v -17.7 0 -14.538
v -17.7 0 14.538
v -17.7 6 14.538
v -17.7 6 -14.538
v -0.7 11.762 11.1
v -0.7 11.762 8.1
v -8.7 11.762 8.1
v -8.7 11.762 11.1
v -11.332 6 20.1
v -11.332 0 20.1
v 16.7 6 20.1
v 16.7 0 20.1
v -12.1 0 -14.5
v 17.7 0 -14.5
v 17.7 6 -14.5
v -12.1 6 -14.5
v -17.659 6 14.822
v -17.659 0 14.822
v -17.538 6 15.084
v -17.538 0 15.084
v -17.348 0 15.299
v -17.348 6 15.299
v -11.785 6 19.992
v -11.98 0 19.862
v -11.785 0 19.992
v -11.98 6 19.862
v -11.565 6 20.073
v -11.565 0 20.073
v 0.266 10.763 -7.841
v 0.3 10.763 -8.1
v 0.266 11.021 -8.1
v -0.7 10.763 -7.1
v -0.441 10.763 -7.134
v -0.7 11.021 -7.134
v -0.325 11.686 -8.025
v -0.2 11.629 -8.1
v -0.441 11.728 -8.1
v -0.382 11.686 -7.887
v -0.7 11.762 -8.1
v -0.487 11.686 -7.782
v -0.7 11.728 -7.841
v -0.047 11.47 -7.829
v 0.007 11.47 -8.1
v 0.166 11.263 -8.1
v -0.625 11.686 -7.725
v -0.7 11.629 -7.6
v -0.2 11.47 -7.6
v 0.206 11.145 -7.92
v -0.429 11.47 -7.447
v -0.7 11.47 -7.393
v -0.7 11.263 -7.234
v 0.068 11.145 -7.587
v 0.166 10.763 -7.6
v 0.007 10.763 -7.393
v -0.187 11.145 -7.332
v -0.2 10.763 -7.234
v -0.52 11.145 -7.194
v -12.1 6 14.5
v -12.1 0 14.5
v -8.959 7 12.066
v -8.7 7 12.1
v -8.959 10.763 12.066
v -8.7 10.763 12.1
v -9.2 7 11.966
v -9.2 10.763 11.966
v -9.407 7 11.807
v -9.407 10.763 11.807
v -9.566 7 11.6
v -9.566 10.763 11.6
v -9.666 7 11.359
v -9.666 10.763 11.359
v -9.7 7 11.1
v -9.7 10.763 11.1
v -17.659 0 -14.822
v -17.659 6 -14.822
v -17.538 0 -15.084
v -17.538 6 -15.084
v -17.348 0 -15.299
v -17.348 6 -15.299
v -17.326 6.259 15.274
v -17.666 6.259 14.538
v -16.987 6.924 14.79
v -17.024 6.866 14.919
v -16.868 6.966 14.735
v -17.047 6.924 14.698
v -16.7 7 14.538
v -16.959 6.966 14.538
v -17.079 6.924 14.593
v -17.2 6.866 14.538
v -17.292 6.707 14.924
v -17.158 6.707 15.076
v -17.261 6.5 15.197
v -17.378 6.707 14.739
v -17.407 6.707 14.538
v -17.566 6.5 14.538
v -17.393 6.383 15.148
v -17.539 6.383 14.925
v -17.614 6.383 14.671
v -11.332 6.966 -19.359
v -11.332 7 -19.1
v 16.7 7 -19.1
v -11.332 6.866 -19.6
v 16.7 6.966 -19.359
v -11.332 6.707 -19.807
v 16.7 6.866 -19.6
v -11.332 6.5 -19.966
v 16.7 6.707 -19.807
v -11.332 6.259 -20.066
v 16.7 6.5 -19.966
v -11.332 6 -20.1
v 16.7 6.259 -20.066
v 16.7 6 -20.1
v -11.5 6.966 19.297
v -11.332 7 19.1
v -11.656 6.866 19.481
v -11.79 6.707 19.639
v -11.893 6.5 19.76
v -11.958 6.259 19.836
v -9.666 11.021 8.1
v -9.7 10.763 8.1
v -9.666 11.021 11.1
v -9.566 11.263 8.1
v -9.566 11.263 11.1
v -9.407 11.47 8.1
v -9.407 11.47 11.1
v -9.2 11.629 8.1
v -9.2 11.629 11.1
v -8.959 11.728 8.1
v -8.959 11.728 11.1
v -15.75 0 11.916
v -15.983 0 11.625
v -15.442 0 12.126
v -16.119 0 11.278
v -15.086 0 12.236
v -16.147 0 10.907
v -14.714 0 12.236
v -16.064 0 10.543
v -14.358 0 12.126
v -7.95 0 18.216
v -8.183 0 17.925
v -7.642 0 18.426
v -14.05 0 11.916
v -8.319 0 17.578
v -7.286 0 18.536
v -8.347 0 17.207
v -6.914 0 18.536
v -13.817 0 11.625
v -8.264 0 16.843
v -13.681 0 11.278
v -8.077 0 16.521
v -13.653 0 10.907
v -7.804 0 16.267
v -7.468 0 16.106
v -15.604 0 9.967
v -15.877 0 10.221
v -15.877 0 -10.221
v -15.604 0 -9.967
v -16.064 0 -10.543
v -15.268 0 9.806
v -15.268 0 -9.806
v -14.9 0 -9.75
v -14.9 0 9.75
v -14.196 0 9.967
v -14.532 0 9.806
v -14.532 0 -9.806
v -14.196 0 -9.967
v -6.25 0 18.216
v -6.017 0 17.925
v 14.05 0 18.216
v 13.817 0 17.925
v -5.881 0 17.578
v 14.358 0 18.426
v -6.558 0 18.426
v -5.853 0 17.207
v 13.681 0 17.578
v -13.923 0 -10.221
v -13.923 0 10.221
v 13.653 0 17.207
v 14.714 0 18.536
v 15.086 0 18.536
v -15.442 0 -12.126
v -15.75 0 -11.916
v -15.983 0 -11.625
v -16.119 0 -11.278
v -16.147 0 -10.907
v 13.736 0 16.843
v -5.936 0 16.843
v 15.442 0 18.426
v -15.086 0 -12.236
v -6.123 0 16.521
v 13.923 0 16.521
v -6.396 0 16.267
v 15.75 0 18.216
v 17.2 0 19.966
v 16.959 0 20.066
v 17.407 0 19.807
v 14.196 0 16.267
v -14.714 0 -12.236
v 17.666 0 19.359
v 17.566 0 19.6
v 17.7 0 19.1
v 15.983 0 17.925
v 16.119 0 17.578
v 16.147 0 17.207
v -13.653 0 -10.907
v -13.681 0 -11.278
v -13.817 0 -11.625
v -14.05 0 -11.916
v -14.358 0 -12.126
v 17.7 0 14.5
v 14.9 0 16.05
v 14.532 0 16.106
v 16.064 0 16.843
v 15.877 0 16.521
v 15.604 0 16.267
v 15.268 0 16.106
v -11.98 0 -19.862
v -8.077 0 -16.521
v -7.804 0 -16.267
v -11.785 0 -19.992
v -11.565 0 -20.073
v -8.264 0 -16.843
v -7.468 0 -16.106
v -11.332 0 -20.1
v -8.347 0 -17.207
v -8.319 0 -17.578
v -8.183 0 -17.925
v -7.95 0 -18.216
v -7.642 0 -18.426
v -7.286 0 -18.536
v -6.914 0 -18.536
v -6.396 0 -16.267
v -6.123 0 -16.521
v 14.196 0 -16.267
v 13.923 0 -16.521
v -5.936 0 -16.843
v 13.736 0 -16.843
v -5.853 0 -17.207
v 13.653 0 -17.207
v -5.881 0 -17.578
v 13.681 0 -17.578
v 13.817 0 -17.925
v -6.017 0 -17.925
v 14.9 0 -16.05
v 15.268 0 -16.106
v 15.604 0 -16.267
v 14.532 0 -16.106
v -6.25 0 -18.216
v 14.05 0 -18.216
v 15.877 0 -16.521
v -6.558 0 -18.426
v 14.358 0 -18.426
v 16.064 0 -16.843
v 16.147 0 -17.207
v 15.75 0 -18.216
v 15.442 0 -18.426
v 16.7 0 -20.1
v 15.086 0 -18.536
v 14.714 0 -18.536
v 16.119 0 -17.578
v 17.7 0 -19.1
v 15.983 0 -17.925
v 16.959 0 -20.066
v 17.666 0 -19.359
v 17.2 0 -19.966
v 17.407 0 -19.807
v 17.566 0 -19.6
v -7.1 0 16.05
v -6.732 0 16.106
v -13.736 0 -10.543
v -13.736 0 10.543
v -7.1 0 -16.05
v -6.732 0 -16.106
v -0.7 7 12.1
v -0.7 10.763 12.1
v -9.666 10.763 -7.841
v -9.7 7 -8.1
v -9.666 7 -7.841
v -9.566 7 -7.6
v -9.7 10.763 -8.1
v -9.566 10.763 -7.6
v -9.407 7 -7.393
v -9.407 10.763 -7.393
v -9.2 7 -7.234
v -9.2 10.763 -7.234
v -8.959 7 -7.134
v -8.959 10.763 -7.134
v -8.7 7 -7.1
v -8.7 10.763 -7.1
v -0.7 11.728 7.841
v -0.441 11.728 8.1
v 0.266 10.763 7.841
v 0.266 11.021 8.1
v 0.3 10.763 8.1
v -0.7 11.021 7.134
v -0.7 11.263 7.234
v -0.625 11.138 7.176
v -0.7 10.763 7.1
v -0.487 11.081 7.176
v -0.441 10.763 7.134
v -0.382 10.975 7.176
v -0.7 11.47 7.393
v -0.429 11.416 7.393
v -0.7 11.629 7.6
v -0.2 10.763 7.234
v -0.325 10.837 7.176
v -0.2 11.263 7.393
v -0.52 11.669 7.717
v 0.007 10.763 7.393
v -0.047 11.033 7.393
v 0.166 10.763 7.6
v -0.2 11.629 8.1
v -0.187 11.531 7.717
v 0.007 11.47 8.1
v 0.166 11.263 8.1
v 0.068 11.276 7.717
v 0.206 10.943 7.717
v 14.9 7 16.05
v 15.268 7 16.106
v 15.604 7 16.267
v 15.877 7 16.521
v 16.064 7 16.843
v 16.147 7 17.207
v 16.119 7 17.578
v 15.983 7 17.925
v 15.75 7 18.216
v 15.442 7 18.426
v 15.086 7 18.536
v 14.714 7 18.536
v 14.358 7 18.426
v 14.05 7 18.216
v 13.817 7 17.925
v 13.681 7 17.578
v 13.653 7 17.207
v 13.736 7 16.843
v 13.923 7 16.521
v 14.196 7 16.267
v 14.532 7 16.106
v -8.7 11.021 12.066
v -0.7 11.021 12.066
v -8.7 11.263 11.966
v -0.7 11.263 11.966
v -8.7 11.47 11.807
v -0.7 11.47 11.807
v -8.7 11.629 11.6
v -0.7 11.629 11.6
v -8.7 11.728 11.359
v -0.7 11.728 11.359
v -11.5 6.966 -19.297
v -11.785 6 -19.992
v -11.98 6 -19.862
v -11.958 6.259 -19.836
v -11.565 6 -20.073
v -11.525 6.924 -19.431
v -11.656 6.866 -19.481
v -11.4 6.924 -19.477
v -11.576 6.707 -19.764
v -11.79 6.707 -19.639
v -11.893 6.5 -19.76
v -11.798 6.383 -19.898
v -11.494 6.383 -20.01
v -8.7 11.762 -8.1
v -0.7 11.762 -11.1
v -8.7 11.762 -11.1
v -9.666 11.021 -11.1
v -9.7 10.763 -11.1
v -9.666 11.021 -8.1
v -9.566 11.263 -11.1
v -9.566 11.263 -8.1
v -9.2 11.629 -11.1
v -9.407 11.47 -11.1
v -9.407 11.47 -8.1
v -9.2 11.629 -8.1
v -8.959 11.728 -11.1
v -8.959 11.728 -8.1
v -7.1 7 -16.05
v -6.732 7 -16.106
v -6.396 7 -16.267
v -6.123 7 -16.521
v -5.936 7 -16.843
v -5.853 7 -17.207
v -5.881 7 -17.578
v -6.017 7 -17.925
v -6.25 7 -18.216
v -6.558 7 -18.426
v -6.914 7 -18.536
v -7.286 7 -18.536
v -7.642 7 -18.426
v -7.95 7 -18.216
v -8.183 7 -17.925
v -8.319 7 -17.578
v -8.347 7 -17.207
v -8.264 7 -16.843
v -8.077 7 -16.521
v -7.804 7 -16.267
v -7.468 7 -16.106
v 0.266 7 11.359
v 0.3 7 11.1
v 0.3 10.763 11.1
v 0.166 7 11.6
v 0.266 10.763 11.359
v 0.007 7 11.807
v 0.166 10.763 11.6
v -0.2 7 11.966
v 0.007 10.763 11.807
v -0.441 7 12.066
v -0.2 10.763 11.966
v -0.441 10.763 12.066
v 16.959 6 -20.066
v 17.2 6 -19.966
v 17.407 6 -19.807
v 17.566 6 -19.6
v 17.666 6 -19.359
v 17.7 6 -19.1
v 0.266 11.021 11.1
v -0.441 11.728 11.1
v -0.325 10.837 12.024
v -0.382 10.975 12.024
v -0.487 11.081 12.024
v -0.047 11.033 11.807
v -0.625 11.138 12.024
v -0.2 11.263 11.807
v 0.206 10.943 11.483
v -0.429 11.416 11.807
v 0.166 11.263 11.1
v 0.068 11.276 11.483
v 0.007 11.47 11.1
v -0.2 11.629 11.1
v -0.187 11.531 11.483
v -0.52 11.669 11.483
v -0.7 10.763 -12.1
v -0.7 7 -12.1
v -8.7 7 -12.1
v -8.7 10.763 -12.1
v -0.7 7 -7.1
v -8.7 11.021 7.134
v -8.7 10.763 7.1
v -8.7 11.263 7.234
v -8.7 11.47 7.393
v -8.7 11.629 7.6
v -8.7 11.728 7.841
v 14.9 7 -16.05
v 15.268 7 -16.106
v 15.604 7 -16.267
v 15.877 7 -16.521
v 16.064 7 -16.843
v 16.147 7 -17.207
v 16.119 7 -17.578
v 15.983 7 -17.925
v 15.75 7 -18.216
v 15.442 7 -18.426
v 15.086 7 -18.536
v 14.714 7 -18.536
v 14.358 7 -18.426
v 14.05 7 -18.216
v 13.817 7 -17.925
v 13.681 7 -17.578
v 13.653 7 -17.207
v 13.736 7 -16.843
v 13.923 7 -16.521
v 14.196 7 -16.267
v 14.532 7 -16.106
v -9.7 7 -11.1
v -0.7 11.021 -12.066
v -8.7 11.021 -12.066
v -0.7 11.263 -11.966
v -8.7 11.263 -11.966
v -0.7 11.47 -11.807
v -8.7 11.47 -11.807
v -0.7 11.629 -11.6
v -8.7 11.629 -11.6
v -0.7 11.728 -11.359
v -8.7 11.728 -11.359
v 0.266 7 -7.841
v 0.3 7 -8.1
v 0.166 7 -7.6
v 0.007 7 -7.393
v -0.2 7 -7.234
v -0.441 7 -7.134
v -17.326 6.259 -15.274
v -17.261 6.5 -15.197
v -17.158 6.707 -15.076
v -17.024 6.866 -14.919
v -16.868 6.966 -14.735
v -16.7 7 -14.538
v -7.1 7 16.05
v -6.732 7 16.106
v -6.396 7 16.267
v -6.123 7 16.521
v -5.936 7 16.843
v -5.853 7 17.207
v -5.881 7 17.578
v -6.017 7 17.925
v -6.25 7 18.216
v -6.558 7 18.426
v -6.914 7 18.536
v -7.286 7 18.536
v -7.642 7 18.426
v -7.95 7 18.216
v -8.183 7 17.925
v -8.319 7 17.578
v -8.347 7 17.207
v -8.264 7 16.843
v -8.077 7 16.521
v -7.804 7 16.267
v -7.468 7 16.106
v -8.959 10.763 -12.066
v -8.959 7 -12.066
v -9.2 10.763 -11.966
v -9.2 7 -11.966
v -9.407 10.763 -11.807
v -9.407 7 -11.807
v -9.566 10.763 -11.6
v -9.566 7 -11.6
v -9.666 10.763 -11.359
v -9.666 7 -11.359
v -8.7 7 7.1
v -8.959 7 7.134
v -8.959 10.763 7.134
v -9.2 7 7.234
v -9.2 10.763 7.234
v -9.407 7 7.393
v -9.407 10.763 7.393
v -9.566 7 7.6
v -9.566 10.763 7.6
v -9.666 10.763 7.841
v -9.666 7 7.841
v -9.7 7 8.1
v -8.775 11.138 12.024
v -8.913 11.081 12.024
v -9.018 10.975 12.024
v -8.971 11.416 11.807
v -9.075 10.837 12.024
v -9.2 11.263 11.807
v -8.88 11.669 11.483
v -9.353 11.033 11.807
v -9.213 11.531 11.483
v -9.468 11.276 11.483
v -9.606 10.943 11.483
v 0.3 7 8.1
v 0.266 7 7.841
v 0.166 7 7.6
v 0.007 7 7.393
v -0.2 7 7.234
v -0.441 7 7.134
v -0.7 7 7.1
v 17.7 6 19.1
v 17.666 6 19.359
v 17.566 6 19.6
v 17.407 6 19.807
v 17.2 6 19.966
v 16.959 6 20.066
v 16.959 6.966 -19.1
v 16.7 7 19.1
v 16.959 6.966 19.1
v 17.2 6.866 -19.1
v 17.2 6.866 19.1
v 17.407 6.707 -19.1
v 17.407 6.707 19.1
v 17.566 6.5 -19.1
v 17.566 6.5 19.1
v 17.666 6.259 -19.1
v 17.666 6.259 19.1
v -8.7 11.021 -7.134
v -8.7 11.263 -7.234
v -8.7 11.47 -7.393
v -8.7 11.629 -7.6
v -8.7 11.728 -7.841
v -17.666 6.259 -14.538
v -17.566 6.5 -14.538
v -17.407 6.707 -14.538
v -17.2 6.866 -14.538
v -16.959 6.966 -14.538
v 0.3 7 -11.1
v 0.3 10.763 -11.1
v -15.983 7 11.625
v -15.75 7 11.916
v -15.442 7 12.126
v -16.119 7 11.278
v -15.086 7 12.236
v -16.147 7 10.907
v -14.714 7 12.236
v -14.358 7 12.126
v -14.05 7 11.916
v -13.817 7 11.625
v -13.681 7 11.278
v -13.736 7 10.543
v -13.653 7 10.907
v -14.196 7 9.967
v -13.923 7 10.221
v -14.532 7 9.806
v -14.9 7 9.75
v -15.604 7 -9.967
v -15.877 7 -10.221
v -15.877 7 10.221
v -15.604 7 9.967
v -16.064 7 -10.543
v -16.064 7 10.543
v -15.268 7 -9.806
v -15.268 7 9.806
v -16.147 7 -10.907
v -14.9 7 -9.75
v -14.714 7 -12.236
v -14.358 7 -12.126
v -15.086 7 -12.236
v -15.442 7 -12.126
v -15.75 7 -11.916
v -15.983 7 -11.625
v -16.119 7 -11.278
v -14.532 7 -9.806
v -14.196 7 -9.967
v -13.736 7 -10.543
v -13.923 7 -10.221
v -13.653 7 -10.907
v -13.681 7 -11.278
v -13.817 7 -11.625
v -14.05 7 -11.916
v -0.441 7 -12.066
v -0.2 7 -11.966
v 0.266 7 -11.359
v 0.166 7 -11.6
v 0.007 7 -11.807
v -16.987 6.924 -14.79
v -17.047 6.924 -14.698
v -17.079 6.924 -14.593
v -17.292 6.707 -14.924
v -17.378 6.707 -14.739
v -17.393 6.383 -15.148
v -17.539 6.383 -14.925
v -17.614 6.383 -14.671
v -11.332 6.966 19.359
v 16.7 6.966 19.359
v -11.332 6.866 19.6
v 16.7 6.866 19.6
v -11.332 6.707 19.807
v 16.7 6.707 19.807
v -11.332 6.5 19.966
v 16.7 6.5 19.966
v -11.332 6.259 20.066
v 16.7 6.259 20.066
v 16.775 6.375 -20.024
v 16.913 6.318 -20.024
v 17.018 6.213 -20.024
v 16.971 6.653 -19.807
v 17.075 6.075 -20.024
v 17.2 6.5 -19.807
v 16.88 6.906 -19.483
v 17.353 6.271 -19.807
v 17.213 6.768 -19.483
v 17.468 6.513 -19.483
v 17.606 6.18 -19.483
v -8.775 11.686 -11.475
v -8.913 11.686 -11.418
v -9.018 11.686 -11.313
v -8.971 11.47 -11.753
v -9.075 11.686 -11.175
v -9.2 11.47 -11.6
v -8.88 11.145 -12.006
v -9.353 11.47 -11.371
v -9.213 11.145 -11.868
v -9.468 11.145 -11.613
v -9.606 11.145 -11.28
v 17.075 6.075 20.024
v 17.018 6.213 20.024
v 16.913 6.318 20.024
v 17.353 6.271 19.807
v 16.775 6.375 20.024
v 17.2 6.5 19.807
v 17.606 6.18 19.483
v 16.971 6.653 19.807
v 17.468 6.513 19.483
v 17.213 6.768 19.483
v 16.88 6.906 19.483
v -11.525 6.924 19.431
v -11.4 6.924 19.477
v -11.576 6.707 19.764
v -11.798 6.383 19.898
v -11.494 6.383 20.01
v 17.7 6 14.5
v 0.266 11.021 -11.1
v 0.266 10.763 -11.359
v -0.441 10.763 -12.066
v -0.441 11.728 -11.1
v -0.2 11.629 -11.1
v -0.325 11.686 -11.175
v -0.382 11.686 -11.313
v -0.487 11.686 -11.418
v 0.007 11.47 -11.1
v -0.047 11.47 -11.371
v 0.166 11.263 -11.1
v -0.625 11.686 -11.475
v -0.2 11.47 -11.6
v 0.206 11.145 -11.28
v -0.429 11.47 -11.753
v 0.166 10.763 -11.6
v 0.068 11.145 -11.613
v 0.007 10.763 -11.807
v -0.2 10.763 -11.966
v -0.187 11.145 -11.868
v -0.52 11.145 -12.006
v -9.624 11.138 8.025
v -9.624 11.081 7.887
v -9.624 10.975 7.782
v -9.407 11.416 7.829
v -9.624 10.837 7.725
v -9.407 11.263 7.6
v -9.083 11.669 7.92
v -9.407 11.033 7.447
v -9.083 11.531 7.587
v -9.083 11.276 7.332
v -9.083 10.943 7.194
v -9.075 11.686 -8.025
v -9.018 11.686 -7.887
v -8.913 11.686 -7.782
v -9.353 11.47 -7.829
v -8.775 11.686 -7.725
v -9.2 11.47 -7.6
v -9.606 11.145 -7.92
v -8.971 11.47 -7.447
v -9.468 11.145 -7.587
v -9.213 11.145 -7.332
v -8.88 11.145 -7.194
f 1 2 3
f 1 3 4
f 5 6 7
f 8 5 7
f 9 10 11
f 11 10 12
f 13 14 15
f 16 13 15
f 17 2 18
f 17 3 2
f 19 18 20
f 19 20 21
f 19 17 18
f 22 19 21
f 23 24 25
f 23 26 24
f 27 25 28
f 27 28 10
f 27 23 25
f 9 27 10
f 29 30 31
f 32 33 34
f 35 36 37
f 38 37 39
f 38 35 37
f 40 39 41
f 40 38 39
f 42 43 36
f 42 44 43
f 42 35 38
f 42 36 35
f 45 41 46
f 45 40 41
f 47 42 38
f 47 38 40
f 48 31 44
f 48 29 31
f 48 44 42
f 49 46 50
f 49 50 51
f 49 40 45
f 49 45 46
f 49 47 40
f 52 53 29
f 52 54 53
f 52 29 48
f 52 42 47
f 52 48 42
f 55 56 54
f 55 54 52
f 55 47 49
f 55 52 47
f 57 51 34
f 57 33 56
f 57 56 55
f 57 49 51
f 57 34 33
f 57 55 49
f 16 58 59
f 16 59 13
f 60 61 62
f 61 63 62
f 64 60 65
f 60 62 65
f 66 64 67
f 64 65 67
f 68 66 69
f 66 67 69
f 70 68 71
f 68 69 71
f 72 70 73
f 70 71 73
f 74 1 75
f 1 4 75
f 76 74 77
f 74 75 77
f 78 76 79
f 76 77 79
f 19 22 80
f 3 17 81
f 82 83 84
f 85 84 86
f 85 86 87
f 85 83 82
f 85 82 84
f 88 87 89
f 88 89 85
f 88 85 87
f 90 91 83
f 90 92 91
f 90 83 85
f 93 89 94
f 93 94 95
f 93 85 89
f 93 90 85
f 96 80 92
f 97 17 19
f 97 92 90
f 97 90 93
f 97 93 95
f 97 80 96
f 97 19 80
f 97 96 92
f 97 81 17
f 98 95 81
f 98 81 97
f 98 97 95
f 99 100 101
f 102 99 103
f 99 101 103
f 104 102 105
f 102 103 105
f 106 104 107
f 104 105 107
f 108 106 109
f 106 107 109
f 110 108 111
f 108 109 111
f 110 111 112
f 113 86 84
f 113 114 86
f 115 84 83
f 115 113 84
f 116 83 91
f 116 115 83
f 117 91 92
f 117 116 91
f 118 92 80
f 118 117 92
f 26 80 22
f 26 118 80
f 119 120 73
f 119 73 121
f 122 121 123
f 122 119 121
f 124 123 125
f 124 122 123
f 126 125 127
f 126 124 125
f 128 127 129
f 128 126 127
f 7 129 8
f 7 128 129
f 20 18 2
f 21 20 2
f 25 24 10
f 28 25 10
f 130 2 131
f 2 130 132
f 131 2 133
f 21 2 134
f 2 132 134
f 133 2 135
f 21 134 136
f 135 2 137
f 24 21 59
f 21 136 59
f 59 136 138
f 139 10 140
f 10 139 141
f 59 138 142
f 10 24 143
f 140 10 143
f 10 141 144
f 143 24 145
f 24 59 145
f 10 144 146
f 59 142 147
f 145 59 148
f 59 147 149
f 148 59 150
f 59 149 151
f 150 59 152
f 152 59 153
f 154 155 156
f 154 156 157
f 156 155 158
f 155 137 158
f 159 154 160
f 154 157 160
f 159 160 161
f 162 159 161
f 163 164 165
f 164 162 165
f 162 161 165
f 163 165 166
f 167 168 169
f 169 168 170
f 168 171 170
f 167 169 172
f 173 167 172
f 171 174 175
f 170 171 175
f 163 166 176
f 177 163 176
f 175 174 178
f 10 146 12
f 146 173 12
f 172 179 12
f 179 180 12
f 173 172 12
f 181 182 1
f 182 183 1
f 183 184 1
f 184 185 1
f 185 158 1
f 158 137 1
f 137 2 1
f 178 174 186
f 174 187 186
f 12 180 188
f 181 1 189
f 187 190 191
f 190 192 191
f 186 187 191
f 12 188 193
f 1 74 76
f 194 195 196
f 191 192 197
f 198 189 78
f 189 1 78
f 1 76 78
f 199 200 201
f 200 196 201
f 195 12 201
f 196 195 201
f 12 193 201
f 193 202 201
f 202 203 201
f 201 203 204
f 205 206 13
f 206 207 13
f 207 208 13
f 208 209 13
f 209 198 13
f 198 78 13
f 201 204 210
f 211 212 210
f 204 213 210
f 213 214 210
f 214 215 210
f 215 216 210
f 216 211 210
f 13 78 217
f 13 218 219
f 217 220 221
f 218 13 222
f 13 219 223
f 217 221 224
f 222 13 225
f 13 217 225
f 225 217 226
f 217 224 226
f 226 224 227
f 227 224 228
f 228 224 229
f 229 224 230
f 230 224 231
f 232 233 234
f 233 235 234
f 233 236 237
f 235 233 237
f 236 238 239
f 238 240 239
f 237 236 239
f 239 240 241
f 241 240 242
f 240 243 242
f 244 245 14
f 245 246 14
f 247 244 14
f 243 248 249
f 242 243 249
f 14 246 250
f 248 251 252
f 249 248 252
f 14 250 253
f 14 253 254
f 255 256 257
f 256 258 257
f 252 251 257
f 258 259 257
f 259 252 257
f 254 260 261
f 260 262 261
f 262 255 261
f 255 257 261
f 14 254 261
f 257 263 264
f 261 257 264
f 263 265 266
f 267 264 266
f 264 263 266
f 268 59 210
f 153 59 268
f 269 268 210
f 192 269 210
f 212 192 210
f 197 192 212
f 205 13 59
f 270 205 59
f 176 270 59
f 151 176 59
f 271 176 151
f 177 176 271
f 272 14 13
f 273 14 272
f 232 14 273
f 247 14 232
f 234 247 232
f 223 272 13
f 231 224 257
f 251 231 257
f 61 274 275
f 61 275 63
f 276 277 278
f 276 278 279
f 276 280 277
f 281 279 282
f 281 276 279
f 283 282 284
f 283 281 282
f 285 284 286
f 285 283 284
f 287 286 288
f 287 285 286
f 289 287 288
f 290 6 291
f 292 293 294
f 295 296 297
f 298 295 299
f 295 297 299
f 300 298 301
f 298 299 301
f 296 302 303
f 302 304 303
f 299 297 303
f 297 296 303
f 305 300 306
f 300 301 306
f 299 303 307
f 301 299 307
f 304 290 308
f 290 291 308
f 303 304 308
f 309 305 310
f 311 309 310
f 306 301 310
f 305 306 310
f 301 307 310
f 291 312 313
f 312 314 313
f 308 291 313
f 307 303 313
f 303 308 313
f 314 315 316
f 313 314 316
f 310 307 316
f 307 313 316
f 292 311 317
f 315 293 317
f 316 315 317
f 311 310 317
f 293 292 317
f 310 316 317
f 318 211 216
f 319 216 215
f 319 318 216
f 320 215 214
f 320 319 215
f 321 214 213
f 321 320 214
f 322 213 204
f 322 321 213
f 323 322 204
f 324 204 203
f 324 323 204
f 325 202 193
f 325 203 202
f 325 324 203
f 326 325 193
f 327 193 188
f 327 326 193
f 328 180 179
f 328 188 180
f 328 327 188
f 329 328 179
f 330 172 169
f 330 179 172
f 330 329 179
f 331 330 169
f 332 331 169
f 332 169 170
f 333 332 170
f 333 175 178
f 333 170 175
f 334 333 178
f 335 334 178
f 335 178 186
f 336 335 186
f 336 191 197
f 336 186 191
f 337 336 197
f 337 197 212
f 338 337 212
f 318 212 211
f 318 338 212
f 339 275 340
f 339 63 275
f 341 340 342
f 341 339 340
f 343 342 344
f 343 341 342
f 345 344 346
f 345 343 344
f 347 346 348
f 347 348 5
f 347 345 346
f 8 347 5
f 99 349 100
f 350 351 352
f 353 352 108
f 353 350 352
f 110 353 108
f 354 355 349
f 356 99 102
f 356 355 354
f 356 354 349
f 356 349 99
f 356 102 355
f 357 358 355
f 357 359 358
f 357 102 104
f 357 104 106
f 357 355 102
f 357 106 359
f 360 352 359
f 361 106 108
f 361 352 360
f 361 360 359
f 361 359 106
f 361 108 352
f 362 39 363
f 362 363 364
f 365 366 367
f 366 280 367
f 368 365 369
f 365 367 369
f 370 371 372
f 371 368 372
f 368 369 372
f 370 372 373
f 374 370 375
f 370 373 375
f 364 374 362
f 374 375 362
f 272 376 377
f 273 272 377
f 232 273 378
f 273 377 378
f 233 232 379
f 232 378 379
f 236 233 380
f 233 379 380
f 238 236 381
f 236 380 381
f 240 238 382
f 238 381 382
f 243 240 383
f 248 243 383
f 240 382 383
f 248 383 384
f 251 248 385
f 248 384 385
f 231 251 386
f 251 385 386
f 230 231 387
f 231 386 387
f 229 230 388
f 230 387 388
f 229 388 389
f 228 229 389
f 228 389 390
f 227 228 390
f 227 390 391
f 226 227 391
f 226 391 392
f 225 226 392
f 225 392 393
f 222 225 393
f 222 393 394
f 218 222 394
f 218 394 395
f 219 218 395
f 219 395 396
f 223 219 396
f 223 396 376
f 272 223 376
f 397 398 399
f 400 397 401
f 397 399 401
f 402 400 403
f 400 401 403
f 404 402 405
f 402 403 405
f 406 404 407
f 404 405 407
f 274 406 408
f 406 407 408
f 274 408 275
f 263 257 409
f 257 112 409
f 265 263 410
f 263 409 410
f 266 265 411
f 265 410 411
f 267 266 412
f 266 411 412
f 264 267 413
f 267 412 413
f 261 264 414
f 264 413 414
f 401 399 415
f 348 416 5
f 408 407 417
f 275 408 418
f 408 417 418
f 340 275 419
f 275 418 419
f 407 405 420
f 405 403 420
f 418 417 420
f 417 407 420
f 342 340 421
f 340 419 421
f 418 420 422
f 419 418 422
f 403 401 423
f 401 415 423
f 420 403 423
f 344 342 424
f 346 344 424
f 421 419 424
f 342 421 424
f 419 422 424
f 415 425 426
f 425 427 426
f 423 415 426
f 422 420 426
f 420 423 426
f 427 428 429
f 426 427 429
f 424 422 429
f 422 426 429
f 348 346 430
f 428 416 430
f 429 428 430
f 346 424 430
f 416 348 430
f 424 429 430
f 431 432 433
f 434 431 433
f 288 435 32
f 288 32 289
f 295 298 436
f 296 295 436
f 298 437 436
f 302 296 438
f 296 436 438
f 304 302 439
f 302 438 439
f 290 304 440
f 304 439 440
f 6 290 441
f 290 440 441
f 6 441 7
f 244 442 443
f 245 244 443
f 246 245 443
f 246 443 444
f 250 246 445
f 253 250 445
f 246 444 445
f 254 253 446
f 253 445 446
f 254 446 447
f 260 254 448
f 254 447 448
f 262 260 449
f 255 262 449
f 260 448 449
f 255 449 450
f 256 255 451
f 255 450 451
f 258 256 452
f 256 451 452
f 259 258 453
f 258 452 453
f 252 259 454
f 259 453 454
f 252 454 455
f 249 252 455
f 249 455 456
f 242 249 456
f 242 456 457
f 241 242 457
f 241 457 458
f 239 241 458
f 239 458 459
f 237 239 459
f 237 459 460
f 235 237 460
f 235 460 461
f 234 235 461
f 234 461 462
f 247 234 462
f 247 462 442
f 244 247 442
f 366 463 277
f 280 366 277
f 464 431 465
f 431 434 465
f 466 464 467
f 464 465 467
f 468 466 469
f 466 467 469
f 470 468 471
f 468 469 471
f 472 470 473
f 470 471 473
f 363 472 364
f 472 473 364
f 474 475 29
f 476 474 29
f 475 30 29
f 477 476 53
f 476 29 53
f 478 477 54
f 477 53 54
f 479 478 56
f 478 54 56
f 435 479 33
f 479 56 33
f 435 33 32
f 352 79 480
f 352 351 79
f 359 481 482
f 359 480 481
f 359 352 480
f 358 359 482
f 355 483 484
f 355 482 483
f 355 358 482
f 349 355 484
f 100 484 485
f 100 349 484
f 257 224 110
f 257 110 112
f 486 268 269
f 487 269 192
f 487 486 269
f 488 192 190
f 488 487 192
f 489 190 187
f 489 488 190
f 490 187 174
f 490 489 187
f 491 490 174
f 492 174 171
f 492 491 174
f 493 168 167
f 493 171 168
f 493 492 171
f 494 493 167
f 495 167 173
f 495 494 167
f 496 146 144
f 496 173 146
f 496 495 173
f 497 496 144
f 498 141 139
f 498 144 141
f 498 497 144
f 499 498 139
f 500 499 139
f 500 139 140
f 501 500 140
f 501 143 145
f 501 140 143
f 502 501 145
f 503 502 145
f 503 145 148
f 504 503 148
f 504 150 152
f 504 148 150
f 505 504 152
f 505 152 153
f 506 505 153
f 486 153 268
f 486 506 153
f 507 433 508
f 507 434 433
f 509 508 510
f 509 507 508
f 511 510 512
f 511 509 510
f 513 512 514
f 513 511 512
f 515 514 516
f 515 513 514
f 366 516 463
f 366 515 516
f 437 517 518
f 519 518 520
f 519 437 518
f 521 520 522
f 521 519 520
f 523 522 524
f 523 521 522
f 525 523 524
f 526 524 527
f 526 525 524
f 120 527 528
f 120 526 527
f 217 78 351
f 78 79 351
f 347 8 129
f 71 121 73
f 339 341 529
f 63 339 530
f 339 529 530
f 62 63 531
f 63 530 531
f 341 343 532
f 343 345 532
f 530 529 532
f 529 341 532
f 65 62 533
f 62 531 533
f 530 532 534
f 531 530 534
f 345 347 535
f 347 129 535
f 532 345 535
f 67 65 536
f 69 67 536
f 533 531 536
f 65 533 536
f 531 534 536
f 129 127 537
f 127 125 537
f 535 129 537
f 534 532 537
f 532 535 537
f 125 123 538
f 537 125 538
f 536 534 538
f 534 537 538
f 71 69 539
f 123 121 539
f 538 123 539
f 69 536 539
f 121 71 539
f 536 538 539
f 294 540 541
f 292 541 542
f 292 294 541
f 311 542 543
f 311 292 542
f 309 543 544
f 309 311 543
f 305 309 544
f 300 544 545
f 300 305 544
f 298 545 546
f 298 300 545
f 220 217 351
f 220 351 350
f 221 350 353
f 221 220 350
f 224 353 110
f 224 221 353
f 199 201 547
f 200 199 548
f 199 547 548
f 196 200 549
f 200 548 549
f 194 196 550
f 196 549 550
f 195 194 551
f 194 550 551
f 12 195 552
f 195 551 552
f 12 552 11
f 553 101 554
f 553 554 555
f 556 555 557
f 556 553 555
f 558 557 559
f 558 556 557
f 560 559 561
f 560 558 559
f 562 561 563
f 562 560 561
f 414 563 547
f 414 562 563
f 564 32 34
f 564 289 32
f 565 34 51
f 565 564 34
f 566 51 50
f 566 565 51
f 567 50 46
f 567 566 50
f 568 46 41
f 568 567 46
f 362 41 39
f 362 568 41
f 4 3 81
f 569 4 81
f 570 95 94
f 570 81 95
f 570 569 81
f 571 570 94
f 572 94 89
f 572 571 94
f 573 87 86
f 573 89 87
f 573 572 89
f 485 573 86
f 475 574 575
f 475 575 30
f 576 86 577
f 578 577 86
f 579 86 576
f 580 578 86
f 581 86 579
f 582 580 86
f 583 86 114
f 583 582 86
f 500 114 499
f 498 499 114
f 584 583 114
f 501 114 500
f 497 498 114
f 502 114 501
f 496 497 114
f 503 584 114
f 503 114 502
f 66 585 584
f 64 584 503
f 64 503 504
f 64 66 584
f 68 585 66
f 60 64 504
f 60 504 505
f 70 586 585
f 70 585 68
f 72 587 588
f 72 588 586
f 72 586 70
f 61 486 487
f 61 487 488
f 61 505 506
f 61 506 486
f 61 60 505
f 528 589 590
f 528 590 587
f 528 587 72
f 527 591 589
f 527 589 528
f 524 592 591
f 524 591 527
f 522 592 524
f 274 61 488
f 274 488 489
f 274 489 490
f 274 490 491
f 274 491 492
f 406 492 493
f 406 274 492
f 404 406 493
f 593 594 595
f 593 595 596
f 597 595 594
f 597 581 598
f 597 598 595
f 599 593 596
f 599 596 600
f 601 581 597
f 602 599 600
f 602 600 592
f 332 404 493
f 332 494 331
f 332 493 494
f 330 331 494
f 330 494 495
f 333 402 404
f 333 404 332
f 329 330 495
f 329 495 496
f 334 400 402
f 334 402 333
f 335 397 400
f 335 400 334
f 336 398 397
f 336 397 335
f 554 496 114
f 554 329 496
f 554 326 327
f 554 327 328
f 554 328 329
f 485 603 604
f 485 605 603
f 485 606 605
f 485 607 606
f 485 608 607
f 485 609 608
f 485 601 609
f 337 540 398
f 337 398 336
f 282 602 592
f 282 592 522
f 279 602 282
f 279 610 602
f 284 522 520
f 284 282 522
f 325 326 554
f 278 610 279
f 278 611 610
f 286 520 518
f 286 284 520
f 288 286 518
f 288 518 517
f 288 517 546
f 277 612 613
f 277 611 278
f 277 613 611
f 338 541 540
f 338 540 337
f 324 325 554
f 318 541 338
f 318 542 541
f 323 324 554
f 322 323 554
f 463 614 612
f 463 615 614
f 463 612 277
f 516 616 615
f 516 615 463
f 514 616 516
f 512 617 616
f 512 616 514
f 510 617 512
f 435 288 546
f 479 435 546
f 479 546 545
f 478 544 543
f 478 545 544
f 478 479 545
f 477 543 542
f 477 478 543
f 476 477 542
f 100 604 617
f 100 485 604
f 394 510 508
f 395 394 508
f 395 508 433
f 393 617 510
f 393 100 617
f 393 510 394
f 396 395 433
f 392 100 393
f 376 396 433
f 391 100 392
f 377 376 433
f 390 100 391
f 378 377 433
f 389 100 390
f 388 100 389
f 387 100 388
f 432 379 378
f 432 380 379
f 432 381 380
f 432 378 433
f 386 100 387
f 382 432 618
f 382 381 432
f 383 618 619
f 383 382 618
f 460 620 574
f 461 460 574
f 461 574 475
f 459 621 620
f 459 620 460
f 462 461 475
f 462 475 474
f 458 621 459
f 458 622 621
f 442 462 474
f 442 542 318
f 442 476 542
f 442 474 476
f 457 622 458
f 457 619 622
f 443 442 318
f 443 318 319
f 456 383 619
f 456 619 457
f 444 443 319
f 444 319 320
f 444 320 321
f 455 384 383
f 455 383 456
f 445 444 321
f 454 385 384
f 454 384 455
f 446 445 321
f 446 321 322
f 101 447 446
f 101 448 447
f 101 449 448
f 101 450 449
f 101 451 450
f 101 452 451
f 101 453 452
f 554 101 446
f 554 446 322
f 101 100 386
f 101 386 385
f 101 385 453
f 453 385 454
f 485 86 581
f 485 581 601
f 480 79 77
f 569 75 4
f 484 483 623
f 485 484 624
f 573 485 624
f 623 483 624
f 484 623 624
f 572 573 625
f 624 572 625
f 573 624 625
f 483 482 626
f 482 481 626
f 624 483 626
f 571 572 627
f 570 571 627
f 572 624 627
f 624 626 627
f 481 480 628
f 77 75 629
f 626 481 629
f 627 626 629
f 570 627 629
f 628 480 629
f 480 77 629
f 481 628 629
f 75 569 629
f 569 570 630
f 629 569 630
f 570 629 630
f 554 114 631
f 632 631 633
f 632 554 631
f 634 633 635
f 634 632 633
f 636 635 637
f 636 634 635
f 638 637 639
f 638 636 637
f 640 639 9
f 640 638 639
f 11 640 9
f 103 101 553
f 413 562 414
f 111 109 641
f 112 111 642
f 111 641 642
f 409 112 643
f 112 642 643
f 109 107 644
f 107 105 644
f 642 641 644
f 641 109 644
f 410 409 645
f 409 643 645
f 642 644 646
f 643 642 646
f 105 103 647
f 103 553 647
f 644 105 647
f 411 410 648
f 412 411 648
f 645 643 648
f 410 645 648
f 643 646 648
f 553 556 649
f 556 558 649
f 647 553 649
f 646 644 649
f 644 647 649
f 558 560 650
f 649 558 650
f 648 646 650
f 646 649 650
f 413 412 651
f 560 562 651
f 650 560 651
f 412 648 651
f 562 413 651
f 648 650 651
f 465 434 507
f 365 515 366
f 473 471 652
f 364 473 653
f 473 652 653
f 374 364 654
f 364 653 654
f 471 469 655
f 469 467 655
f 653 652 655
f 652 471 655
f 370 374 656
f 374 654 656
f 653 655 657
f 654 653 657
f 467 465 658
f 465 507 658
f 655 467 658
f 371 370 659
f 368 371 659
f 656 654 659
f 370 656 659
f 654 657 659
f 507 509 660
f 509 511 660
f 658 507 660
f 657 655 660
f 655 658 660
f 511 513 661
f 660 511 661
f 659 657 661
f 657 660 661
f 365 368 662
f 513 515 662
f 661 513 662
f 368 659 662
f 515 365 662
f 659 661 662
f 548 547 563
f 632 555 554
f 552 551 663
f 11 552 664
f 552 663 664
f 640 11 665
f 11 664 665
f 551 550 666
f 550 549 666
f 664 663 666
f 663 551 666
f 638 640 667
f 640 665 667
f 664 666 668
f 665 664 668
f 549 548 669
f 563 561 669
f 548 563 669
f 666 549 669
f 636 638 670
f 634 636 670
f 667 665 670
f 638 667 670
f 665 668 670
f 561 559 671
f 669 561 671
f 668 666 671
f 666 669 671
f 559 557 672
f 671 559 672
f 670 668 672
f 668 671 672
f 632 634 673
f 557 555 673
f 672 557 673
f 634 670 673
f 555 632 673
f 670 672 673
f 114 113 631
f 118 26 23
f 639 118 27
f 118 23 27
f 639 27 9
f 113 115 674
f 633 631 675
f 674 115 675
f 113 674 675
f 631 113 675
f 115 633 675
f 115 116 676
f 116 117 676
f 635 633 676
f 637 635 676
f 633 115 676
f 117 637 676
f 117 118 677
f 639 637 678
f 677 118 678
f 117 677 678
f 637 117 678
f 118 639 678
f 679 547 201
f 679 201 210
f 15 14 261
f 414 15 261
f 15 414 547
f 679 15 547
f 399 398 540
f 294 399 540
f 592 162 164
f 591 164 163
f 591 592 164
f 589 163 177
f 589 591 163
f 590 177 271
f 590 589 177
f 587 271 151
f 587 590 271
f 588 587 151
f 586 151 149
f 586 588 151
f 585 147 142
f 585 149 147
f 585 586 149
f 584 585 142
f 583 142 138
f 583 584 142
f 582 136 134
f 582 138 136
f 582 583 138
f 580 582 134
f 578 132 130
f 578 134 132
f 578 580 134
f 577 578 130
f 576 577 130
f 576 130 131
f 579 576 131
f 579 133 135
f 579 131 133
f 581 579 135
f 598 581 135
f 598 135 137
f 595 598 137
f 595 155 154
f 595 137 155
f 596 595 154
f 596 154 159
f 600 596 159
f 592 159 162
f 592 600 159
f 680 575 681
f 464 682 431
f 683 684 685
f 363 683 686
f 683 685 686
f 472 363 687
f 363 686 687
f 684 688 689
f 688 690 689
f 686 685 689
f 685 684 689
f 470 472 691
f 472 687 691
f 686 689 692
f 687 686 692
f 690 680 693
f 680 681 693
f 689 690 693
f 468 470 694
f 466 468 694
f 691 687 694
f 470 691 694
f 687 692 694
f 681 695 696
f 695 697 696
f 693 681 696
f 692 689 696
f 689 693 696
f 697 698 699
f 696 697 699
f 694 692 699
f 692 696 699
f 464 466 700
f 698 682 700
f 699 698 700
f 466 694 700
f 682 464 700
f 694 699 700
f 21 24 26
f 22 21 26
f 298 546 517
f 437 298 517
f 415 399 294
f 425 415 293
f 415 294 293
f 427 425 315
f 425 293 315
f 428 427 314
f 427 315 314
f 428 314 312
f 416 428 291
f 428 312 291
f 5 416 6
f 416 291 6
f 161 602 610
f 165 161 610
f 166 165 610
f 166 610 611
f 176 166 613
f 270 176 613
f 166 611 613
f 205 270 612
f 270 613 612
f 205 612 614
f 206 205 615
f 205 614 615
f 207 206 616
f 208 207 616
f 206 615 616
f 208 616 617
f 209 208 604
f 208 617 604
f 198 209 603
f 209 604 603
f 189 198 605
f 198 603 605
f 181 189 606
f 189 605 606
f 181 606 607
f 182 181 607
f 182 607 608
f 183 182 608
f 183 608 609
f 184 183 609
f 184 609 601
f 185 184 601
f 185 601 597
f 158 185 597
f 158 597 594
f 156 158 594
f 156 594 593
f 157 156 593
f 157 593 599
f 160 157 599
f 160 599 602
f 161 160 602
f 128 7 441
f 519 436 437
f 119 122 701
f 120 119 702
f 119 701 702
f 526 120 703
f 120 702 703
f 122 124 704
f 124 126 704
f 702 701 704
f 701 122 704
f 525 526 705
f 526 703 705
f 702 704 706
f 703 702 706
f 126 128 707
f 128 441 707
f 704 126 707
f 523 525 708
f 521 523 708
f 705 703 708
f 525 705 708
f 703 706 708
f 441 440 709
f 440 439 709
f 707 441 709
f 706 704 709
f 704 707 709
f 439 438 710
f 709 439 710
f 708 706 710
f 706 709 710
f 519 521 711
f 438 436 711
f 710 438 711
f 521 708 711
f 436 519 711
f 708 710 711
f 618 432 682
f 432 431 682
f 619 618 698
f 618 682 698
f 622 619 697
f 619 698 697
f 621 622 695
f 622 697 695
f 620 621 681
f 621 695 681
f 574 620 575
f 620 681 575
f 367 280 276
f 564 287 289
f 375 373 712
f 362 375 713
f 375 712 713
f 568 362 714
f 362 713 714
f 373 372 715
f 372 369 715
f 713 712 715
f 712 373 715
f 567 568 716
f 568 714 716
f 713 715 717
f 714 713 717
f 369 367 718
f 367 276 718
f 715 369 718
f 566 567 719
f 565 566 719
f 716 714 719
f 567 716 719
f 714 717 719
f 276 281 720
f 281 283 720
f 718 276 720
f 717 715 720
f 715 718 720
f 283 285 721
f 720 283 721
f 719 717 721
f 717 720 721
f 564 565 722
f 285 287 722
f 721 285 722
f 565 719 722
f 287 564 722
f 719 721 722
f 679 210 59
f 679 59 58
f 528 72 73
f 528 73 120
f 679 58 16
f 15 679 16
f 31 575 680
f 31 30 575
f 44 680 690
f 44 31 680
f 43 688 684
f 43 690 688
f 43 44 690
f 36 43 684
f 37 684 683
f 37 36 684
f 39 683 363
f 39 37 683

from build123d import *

# Parameters (mm, degrees)
SKETCH1_W           = 35.4
SKETCH1_H           = 40.2
BOSS_EXTRUDE1_DEPTH = 7
SKETCH2_W           = 29
SKETCH2_H           = 6
CUT_EXTRUDE1_DEPTH  = 29.8
SKETCH3_R           = 1.25
CUT_EXTRUDE2_DEPTH  = 28.682124196
SKETCH4_W           = 10
SKETCH4_H           = 5
BOSS_EXTRUDE2_DEPTH = 4.7625
CHAMFER1_SIZE       = 5.1
CHAMFER1_SIZE2      = 6
MIRROR4_START       = -26.778357323
MIRROR4_OUTLINE_W   = 11
MIRROR4_OUTLINE_H   = 9
MIRROR4_DEPTH       = 3.885890521
FILLET1_R           = 1


# Read off the part's stored shape, not the designer's step: Mirror4
with BuildPart() as part:
    # Sketch1 → Boss-Extrude1 (new body)
    with BuildSketch(Plane(origin=(0, 0, 0), x_dir=(1, 0, 0), z_dir=(0, 1, 0))):
        Rectangle(SKETCH1_W, SKETCH1_H)
    extrude(amount=BOSS_EXTRUDE1_DEPTH)

    # Sketch2 → Cut-Extrude1 (cut)
    with BuildSketch(Plane(origin=(17.7, 0, 0), x_dir=(0, 0, -1), z_dir=(1, 0, 0))):
        with Locations((0, 3)):
            Rectangle(SKETCH2_W, SKETCH2_H)
    extrude(amount=-CUT_EXTRUDE1_DEPTH, mode=Mode.SUBTRACT)

    # Sketch3 → Cut-Extrude2 (cut, through all)
    with BuildSketch(Plane(origin=(0, 7, 0), x_dir=(1, 0, 0), z_dir=(0, 1, 0))):
        with Locations(Location((14.9, 17.3, 0), (0, 0, 270))):
            Circle(SKETCH3_R)
        with Locations(Location((-7.1, 17.3, 0), (0, 0, 270))):
            Circle(SKETCH3_R)
        with Locations(Location((-14.9, 11, 0), (0, 0, 270))):
            Circle(SKETCH3_R)
    cut_extrude2 = extrude(amount=-CUT_EXTRUDE2_DEPTH, mode=Mode.SUBTRACT)

    # Sketch4 → Boss-Extrude2 (add)
    with BuildSketch(Plane(origin=(0, 7, 0), x_dir=(-1, 0, 0), z_dir=(0, 1, 0))):
        with Locations((4.7, -9.6)):
            Rectangle(SKETCH4_W, SKETCH4_H)
    boss_extrude2 = extrude(amount=BOSS_EXTRUDE2_DEPTH)

    # Mirror1: Cut-Extrude2, Boss-Extrude2 across plane
    add(cut_extrude2.mirror(Plane.XY), mode=Mode.SUBTRACT)
    add(boss_extrude2.mirror(Plane.XY))

    # Chamfer1
    chamfer1_edges = [part.edges().sort_by_distance(p)[0] for p in [
        (-17.7, 3.5, 20.1),
    ]]
    chamfer1_side = [part.faces().sort_by_distance(p)[0] for p in [
        (-17.7, 3.5, 0),
    ]]
    chamfer(chamfer1_edges, length=CHAMFER1_SIZE, length2=CHAMFER1_SIZE2, reference=chamfer1_side[0])

    # Mirror4 outline → Mirror4 (cut)
    with BuildSketch(Plane(origin=(0, 0, 0), x_dir=(0.7619393177594598, 0, -0.6476484200955399), z_dir=(0.6476484200955399, 0, 0.7619393177594598)).offset(MIRROR4_START)):
        with Locations((0.5, 3.5)):
            Rectangle(MIRROR4_OUTLINE_W, MIRROR4_OUTLINE_H)
    extrude(amount=MIRROR4_DEPTH, mode=Mode.SUBTRACT)

    # Fillet1
    fillet1_edges = [part.edges().sort_by_distance(p)[0] for p in [
        (17.7, 7, 0),
        (0.3, 9.38125, -7.1),
        (0.3, 9.38125, -12.1),
        (-9.7, 9.38125, -12.1),
        (-9.7, 9.38125, -7.1),
        (0.3, 11.7625, -9.6),
        (-4.7, 11.7625, -12.1),
        (-9.7, 11.7625, -9.6),
        (-4.7, 11.7625, -7.1),
        (0.3, 11.7625, 9.6),
        (0.3, 9.38125, 12.1),
        (-4.7, 11.7625, 7.1),
        (0.3, 9.38125, 7.1),
        (-9.7, 11.7625, 9.6),
        (-9.7, 9.38125, 7.1),
        (-4.7, 11.7625, 12.1),
        (-9.7, 9.38125, 12.1),
        (3, 7, -20.1),
        (17.7, 3.5, 20.1),
        (17.7, 3.5, -20.1),
        (3, 7, 20.1),
        (-11.7, 3.5, 20.1),
        (-17.7, 3.5, 15),
        (-14.7, 7, 17.55),
        (-17.7, 7, 0),
        (-11.7, 3.5, -20.1),
        (-17.7, 3.5, -15),
        (-14.7, 7, -17.55),
    ]]
    fillet(fillet1_edges, radius=FILLET1_R - 0.0001)  # a hair under: the kernel refuses the full size


solid = part.part
